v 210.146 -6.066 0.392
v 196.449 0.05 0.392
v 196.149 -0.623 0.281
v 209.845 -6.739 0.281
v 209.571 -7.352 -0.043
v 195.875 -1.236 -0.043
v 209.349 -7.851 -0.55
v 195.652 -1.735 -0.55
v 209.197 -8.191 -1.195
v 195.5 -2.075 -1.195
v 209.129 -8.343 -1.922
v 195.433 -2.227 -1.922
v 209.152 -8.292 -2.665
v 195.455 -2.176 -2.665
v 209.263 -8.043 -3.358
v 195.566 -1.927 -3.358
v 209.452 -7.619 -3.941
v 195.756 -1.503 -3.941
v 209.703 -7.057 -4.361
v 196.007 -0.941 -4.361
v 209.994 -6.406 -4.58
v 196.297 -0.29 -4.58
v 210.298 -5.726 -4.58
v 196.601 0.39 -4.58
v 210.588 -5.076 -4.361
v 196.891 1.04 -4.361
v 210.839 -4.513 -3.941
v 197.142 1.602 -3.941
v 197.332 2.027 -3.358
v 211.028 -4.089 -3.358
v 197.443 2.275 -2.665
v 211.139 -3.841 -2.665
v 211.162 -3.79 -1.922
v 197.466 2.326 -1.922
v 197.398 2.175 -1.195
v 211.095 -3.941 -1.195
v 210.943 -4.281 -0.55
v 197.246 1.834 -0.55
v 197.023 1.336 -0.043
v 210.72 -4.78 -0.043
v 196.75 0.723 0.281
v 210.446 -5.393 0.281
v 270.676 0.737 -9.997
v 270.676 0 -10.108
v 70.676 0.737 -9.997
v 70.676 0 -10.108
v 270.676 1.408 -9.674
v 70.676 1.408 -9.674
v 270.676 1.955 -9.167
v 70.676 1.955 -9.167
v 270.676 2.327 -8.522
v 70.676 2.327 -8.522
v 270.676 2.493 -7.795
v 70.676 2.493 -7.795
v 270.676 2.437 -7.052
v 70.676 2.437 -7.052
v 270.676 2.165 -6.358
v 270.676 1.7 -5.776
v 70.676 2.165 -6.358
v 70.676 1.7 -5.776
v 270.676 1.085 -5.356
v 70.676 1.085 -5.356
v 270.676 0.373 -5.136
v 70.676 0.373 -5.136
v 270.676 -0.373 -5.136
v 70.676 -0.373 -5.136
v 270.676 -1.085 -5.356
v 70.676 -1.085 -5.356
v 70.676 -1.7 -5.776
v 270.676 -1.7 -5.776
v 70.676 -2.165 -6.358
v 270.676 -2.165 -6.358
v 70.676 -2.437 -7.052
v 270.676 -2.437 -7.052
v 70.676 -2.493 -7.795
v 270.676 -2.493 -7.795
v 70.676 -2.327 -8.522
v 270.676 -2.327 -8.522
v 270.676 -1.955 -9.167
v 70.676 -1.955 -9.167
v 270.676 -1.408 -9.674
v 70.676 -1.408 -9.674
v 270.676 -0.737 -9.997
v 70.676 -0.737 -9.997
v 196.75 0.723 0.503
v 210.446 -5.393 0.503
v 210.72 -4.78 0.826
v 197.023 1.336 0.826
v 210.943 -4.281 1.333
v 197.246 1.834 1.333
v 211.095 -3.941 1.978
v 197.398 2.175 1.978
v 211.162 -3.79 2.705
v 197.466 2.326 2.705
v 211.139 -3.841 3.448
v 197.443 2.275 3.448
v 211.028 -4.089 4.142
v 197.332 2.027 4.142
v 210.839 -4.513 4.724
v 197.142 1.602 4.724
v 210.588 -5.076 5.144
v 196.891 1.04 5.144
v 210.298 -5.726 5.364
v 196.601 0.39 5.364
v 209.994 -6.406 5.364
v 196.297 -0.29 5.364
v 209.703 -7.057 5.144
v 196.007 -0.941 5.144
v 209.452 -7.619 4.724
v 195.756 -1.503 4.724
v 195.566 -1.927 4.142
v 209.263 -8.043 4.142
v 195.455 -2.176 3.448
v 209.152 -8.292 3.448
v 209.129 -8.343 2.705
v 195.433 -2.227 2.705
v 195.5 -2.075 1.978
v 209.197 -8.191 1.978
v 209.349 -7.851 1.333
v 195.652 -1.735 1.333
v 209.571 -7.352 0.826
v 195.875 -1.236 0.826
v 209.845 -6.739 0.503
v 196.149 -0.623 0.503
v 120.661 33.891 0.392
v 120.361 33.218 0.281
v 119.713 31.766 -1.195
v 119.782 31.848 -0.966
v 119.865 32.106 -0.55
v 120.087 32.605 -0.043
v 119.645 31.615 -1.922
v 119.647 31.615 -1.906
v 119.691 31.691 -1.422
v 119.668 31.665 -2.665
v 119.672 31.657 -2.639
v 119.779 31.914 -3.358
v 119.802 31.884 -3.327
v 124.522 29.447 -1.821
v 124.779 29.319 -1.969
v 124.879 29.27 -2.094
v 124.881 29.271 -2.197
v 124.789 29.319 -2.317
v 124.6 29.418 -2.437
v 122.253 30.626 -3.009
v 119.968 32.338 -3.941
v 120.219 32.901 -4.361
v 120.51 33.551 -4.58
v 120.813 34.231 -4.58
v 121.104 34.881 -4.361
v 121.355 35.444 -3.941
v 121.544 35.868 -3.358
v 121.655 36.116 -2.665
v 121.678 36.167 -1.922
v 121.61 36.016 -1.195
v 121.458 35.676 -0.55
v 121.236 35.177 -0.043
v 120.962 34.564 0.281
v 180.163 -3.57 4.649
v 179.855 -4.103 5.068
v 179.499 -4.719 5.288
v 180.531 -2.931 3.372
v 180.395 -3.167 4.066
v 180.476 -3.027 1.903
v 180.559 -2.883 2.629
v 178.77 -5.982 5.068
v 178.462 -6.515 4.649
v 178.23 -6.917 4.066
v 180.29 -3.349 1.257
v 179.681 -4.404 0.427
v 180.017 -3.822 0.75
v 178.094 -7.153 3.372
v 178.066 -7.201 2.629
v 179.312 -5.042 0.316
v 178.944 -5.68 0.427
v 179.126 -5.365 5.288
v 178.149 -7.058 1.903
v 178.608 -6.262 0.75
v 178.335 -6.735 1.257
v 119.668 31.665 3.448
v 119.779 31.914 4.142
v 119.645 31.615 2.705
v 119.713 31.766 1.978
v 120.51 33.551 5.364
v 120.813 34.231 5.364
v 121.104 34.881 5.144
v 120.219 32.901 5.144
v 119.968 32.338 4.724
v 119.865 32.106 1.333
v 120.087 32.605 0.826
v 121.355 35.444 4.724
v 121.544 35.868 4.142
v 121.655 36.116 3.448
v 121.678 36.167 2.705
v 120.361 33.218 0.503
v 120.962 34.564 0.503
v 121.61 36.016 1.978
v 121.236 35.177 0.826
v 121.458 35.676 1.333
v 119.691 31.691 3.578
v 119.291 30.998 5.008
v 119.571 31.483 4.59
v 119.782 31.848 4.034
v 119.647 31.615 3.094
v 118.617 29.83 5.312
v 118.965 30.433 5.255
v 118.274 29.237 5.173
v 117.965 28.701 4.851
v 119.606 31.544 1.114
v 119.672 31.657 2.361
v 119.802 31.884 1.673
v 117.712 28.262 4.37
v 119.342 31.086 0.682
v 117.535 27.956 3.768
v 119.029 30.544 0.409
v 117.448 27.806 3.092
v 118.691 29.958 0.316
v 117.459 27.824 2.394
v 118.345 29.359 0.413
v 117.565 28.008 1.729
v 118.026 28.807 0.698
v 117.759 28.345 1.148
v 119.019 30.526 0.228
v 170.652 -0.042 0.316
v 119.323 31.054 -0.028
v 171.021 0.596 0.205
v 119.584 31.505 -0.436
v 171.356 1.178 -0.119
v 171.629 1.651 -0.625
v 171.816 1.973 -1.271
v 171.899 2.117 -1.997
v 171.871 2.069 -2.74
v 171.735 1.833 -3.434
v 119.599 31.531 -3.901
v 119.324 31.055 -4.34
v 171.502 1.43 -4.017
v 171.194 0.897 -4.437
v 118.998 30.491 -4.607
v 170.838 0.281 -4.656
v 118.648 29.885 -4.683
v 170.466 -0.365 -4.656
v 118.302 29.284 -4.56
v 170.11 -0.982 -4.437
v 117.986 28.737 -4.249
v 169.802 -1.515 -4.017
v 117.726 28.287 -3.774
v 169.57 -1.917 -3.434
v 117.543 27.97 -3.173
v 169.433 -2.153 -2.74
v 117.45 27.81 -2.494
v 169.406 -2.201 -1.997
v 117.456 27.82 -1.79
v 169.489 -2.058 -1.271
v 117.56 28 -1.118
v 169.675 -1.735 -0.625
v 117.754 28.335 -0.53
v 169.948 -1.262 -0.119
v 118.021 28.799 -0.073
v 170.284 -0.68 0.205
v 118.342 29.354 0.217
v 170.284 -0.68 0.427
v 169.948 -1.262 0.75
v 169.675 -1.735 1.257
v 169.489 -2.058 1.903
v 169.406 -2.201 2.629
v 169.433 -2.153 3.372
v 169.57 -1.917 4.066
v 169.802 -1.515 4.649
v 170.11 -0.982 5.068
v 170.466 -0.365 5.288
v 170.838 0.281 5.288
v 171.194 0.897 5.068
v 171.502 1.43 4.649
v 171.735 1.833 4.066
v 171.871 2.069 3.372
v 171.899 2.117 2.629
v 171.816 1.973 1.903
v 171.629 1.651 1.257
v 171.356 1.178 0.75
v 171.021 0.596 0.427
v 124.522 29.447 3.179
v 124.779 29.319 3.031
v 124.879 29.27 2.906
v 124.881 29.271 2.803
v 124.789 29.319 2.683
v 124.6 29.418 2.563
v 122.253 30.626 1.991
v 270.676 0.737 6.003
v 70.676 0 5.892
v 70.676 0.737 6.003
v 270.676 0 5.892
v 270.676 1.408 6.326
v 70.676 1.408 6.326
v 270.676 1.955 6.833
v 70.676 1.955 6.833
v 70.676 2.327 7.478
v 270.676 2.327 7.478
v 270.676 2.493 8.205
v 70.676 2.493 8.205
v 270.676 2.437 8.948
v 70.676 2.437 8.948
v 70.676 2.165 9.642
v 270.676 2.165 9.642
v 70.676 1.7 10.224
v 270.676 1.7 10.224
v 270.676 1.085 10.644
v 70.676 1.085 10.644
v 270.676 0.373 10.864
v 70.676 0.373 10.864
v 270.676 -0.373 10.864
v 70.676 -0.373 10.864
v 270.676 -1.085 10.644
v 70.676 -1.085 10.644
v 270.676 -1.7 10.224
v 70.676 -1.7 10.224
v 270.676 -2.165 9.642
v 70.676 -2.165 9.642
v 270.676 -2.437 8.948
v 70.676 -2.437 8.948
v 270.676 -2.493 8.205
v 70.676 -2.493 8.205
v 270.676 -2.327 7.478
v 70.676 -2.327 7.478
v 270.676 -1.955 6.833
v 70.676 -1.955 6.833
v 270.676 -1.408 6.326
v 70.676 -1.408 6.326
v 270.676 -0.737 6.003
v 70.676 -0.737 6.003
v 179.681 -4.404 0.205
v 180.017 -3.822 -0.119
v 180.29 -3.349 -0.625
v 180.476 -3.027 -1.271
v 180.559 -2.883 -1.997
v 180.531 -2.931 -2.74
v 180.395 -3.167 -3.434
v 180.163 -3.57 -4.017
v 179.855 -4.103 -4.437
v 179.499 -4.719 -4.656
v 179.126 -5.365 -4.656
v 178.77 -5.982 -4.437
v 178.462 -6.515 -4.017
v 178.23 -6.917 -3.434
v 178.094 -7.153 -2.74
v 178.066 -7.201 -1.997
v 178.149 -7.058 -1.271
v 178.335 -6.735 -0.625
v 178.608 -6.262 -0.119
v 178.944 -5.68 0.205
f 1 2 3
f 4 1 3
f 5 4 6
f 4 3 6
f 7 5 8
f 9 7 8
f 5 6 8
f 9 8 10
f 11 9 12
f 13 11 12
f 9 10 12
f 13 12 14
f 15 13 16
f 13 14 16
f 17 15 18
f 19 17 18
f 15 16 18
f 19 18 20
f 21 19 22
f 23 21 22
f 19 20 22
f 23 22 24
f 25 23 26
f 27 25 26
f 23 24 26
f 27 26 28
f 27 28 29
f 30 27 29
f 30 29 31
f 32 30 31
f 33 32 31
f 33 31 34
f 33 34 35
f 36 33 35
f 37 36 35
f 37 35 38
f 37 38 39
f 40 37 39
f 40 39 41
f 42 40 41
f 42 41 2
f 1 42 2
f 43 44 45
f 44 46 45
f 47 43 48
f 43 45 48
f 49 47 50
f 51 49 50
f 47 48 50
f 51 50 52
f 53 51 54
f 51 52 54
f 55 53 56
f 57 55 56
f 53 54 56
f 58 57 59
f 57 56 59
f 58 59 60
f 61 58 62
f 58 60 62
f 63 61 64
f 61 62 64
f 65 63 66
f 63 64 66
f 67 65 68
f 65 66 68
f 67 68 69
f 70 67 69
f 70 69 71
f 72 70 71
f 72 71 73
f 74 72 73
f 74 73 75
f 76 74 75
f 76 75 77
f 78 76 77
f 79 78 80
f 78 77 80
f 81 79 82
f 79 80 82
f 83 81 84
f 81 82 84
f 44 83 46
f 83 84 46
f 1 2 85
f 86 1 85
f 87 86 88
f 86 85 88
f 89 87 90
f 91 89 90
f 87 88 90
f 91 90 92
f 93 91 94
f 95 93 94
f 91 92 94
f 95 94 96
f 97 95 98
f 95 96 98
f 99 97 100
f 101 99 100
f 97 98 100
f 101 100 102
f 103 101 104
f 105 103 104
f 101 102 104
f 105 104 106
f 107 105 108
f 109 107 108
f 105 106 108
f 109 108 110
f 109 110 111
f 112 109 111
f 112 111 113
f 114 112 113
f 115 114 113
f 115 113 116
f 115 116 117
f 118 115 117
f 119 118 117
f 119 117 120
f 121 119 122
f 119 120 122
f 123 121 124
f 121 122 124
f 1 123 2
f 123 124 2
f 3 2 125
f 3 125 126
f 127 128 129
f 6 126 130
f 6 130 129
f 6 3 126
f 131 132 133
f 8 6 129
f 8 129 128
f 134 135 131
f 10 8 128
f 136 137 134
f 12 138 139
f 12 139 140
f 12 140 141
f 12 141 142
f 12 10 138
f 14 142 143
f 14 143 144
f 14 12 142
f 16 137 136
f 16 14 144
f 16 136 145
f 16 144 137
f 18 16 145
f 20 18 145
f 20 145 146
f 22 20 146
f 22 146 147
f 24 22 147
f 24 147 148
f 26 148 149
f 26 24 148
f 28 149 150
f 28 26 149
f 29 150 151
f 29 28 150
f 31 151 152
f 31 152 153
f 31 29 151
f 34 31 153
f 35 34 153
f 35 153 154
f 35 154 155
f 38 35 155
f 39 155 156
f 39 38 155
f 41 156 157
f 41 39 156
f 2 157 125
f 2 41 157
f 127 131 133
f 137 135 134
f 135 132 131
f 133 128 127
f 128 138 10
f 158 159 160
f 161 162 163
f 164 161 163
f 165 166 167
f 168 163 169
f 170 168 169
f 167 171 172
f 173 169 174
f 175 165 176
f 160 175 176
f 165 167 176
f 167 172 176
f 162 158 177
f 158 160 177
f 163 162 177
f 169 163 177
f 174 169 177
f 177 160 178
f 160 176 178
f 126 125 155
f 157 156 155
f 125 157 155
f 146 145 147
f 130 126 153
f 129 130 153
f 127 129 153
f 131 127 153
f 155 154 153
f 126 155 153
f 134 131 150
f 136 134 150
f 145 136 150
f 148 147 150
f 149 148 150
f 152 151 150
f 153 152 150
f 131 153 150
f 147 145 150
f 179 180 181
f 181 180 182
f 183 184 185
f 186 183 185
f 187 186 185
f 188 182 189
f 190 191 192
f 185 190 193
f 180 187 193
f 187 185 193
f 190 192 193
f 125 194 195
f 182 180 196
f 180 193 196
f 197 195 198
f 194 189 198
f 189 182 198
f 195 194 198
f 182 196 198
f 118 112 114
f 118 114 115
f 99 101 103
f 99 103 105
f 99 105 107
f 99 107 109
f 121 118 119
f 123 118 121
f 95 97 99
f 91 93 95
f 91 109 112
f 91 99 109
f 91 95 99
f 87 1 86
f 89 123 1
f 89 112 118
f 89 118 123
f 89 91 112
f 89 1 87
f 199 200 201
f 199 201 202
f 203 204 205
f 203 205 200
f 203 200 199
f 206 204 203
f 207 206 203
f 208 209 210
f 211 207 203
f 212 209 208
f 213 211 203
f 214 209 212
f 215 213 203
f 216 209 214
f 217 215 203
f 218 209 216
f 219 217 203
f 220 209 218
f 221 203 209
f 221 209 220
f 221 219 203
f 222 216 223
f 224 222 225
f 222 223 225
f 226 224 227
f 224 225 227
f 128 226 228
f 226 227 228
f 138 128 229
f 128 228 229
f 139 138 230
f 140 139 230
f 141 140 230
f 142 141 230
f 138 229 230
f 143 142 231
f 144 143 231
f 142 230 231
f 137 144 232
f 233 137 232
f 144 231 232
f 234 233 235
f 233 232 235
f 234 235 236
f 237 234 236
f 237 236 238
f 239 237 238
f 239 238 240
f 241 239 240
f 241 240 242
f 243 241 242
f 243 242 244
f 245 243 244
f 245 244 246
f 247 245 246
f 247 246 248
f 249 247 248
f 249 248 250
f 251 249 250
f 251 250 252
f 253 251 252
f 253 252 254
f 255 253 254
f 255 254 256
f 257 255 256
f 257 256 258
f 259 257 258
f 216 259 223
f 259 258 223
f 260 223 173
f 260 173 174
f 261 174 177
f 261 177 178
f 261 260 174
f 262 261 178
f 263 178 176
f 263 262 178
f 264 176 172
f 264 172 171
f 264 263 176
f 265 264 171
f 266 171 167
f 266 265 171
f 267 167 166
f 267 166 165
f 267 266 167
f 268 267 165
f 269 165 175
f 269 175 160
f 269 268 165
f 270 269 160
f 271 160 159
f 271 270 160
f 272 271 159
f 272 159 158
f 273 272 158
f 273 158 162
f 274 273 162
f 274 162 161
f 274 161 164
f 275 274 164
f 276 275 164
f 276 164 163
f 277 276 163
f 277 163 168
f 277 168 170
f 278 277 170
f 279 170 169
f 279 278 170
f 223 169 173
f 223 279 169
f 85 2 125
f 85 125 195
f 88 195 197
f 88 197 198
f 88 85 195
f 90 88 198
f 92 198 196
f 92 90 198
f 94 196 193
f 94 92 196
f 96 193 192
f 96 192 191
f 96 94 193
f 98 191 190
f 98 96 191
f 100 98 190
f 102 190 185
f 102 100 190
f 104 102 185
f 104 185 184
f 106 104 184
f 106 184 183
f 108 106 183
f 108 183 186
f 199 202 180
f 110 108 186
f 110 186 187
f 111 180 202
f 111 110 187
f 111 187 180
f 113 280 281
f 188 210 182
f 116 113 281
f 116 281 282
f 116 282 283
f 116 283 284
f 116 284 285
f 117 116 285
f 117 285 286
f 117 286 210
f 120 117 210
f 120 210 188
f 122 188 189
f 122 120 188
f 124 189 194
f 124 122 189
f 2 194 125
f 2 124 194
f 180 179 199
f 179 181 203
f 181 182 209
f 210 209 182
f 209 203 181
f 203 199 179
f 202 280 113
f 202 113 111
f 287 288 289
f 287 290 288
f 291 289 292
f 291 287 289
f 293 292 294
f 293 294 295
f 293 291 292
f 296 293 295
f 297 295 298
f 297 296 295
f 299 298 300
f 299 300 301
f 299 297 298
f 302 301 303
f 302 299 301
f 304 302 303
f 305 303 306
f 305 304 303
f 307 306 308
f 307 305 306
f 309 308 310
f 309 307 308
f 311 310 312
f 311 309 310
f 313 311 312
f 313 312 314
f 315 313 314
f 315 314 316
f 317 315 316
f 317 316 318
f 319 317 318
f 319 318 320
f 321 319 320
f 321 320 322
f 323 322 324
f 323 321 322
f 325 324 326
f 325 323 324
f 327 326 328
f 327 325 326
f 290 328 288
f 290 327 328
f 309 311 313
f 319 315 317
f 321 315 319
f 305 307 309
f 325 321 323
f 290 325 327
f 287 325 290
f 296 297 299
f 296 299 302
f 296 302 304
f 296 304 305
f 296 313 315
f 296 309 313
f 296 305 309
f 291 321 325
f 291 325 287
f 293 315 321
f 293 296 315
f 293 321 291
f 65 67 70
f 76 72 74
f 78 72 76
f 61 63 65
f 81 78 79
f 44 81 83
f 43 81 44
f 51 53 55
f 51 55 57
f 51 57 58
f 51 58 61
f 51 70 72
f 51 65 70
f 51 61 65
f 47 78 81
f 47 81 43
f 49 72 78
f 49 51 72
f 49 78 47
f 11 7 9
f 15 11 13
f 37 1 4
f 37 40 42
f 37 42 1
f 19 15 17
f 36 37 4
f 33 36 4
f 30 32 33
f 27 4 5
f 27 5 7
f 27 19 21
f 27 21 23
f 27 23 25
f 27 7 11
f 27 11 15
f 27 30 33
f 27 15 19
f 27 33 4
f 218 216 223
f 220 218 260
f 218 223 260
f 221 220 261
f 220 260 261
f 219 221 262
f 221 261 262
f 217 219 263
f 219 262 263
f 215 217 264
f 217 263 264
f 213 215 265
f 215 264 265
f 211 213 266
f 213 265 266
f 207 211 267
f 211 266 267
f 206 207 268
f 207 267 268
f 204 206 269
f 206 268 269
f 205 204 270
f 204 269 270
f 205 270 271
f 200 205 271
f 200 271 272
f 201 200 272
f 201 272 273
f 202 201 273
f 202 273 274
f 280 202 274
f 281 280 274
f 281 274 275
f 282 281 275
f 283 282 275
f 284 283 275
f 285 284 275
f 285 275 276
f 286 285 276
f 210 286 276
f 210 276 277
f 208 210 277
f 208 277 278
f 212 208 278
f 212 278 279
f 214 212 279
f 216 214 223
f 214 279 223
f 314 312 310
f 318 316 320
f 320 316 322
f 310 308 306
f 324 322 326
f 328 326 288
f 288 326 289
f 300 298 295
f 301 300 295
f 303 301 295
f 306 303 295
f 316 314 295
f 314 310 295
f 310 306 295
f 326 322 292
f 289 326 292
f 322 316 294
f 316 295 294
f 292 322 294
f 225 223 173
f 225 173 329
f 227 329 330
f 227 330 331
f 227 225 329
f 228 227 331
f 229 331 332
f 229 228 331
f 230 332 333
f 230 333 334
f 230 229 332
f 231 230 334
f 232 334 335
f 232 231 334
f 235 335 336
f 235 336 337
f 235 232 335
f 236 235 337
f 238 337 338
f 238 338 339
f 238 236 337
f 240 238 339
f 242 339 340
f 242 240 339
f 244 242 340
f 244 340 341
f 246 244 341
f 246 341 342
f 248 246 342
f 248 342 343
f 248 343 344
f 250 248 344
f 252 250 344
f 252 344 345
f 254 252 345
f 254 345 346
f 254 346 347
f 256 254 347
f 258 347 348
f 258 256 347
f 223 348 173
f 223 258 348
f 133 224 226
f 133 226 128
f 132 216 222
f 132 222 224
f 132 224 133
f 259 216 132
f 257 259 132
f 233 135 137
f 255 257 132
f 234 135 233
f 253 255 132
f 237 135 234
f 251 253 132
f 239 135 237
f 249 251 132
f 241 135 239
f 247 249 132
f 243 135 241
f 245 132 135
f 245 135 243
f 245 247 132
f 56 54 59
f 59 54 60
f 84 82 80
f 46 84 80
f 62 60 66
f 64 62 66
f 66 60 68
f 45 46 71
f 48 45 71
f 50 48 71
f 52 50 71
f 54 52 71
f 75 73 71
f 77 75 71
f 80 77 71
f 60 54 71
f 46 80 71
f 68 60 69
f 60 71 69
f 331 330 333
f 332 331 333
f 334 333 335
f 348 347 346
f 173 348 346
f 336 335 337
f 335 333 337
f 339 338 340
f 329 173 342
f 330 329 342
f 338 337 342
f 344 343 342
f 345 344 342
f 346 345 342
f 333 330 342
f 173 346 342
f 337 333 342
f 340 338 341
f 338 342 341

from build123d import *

# Parameters (mm, degrees)
SKETCH_2_R             = 2.5
EXTRUDE_1_DEPTH        = 100
EXTRUDE_1_DEPTH_BACK   = 100
SKETCH_3_R             = 2.5
EXTRUDE_START          = 100
SKETCH_5_R             = 2.5
EXTRUDE_3_DEPTH        = 100
EXTRUDE_4_DEPTH        = 60
EXTRUDE_4_DEPTH_BACK   = 10
SKETCH_9_R             = 2.5
EXTRUDE_4_2_DEPTH      = 60
EXTRUDE_4_2_DEPTH_BACK = 10
EXTRUDE_5_DEPTH        = 15
EXTRUDE_5_DEPTH_BACK   = 83
SKETCH_12_R            = 2.5


with BuildPart() as part:
    # 扫描1: sweep along a path in 草图1
    with BuildLine(Plane(origin=(0, 0, 0), x_dir=(1, 0, 0), z_dir=(0, 1, 0))) as sweep_1_path:
        Line((70.676444451, 8), (170.676444451, 8))
    # 草图2 → 扫描1 (sweep)
    with BuildSketch(Plane(origin=(170.676444451, 0, -8), x_dir=(0, 0, -1), z_dir=(1, 0, 0))):
        with Locations((-0.391587181, 0)):
            Circle(SKETCH_2_R)
    sweep(path=sweep_1_path.line)

    # 草图5 → 凸台-拉伸3 (add)
    with BuildSketch(Plane(origin=(170.676444451, 0, 0), x_dir=(0, 0, -1), z_dir=(1, 0, 0)).offset(EXTRUDE_START)):
        with Locations((7.608412819, 0)):
            Circle(SKETCH_5_R)
    extrude(amount=-EXTRUDE_3_DEPTH)


with BuildPart() as body_2:
    # 草图3 → 凸台-拉伸1 (new, two sides: drawn at the far end of the back side and taken through both)
    with BuildSketch(Plane(origin=(170.676444451, 0, 0), x_dir=(0, 0, -1), z_dir=(1, 0, 0)).offset(-EXTRUDE_1_DEPTH_BACK)):
        with Locations((-8.391587181, 0)):
            Circle(SKETCH_3_R)
    extrude(amount=EXTRUDE_1_DEPTH + EXTRUDE_1_DEPTH_BACK)


with BuildPart() as body_3:
    # 草图9 → 凸台-拉伸4 (new, two sides: drawn at the far end of the back side and taken through both)
    with BuildSketch(Plane(origin=(128.007333338, -73.905068361, 0), x_dir=(0, 0, -1), z_dir=(-0.8660254037844416, 0.49999999999999495, 0)).offset(-EXTRUDE_4_DEPTH_BACK)):
        with Locations((2.18412613, -85.289583238)):
            Circle(SKETCH_9_R)
    extrude(amount=EXTRUDE_4_DEPTH + EXTRUDE_4_DEPTH_BACK)



with BuildPart() as body_4:
    # 草图9 → Extrude 4 2 (new, two sides: drawn at the far end of the back side and taken through both)
    with BuildSketch(Plane(origin=(128.007333338, -73.905068361, 0), x_dir=(0, 0, -1), z_dir=(-0.8660254037844416, 0.49999999999999495, 0)).offset(-EXTRUDE_4_2_DEPTH_BACK)):
        with Locations((-2.81587387, -85.289583238)):
            Circle(SKETCH_9_R)
    extrude(amount=EXTRUDE_4_2_DEPTH + EXTRUDE_4_2_DEPTH_BACK)


with BuildPart() as body_3_1:
    add(body_3.part)

    add(body_4.part)  # 凸台-拉伸5 merges body 4
    # 草图12 → 凸台-拉伸5 (add, two sides: drawn at the far end of the back side and taken through both)
    with BuildSketch(Plane(origin=(196.426899862, 0, 0), x_dir=(0, 0, -1), z_dir=(0.9131044962608523, -0.40772561718417333, 0)).offset(-EXTRUDE_5_DEPTH_BACK)):
        with Locations((2.108412819, 0.054468103)):
            Circle(SKETCH_12_R)
        with Locations((-2.891587181, 0.054468103)):
            Circle(SKETCH_12_R)
    extrude(amount=EXTRUDE_5_DEPTH + EXTRUDE_5_DEPTH_BACK)


solid = Compound([part.part, body_2.part, body_3_1.part])
